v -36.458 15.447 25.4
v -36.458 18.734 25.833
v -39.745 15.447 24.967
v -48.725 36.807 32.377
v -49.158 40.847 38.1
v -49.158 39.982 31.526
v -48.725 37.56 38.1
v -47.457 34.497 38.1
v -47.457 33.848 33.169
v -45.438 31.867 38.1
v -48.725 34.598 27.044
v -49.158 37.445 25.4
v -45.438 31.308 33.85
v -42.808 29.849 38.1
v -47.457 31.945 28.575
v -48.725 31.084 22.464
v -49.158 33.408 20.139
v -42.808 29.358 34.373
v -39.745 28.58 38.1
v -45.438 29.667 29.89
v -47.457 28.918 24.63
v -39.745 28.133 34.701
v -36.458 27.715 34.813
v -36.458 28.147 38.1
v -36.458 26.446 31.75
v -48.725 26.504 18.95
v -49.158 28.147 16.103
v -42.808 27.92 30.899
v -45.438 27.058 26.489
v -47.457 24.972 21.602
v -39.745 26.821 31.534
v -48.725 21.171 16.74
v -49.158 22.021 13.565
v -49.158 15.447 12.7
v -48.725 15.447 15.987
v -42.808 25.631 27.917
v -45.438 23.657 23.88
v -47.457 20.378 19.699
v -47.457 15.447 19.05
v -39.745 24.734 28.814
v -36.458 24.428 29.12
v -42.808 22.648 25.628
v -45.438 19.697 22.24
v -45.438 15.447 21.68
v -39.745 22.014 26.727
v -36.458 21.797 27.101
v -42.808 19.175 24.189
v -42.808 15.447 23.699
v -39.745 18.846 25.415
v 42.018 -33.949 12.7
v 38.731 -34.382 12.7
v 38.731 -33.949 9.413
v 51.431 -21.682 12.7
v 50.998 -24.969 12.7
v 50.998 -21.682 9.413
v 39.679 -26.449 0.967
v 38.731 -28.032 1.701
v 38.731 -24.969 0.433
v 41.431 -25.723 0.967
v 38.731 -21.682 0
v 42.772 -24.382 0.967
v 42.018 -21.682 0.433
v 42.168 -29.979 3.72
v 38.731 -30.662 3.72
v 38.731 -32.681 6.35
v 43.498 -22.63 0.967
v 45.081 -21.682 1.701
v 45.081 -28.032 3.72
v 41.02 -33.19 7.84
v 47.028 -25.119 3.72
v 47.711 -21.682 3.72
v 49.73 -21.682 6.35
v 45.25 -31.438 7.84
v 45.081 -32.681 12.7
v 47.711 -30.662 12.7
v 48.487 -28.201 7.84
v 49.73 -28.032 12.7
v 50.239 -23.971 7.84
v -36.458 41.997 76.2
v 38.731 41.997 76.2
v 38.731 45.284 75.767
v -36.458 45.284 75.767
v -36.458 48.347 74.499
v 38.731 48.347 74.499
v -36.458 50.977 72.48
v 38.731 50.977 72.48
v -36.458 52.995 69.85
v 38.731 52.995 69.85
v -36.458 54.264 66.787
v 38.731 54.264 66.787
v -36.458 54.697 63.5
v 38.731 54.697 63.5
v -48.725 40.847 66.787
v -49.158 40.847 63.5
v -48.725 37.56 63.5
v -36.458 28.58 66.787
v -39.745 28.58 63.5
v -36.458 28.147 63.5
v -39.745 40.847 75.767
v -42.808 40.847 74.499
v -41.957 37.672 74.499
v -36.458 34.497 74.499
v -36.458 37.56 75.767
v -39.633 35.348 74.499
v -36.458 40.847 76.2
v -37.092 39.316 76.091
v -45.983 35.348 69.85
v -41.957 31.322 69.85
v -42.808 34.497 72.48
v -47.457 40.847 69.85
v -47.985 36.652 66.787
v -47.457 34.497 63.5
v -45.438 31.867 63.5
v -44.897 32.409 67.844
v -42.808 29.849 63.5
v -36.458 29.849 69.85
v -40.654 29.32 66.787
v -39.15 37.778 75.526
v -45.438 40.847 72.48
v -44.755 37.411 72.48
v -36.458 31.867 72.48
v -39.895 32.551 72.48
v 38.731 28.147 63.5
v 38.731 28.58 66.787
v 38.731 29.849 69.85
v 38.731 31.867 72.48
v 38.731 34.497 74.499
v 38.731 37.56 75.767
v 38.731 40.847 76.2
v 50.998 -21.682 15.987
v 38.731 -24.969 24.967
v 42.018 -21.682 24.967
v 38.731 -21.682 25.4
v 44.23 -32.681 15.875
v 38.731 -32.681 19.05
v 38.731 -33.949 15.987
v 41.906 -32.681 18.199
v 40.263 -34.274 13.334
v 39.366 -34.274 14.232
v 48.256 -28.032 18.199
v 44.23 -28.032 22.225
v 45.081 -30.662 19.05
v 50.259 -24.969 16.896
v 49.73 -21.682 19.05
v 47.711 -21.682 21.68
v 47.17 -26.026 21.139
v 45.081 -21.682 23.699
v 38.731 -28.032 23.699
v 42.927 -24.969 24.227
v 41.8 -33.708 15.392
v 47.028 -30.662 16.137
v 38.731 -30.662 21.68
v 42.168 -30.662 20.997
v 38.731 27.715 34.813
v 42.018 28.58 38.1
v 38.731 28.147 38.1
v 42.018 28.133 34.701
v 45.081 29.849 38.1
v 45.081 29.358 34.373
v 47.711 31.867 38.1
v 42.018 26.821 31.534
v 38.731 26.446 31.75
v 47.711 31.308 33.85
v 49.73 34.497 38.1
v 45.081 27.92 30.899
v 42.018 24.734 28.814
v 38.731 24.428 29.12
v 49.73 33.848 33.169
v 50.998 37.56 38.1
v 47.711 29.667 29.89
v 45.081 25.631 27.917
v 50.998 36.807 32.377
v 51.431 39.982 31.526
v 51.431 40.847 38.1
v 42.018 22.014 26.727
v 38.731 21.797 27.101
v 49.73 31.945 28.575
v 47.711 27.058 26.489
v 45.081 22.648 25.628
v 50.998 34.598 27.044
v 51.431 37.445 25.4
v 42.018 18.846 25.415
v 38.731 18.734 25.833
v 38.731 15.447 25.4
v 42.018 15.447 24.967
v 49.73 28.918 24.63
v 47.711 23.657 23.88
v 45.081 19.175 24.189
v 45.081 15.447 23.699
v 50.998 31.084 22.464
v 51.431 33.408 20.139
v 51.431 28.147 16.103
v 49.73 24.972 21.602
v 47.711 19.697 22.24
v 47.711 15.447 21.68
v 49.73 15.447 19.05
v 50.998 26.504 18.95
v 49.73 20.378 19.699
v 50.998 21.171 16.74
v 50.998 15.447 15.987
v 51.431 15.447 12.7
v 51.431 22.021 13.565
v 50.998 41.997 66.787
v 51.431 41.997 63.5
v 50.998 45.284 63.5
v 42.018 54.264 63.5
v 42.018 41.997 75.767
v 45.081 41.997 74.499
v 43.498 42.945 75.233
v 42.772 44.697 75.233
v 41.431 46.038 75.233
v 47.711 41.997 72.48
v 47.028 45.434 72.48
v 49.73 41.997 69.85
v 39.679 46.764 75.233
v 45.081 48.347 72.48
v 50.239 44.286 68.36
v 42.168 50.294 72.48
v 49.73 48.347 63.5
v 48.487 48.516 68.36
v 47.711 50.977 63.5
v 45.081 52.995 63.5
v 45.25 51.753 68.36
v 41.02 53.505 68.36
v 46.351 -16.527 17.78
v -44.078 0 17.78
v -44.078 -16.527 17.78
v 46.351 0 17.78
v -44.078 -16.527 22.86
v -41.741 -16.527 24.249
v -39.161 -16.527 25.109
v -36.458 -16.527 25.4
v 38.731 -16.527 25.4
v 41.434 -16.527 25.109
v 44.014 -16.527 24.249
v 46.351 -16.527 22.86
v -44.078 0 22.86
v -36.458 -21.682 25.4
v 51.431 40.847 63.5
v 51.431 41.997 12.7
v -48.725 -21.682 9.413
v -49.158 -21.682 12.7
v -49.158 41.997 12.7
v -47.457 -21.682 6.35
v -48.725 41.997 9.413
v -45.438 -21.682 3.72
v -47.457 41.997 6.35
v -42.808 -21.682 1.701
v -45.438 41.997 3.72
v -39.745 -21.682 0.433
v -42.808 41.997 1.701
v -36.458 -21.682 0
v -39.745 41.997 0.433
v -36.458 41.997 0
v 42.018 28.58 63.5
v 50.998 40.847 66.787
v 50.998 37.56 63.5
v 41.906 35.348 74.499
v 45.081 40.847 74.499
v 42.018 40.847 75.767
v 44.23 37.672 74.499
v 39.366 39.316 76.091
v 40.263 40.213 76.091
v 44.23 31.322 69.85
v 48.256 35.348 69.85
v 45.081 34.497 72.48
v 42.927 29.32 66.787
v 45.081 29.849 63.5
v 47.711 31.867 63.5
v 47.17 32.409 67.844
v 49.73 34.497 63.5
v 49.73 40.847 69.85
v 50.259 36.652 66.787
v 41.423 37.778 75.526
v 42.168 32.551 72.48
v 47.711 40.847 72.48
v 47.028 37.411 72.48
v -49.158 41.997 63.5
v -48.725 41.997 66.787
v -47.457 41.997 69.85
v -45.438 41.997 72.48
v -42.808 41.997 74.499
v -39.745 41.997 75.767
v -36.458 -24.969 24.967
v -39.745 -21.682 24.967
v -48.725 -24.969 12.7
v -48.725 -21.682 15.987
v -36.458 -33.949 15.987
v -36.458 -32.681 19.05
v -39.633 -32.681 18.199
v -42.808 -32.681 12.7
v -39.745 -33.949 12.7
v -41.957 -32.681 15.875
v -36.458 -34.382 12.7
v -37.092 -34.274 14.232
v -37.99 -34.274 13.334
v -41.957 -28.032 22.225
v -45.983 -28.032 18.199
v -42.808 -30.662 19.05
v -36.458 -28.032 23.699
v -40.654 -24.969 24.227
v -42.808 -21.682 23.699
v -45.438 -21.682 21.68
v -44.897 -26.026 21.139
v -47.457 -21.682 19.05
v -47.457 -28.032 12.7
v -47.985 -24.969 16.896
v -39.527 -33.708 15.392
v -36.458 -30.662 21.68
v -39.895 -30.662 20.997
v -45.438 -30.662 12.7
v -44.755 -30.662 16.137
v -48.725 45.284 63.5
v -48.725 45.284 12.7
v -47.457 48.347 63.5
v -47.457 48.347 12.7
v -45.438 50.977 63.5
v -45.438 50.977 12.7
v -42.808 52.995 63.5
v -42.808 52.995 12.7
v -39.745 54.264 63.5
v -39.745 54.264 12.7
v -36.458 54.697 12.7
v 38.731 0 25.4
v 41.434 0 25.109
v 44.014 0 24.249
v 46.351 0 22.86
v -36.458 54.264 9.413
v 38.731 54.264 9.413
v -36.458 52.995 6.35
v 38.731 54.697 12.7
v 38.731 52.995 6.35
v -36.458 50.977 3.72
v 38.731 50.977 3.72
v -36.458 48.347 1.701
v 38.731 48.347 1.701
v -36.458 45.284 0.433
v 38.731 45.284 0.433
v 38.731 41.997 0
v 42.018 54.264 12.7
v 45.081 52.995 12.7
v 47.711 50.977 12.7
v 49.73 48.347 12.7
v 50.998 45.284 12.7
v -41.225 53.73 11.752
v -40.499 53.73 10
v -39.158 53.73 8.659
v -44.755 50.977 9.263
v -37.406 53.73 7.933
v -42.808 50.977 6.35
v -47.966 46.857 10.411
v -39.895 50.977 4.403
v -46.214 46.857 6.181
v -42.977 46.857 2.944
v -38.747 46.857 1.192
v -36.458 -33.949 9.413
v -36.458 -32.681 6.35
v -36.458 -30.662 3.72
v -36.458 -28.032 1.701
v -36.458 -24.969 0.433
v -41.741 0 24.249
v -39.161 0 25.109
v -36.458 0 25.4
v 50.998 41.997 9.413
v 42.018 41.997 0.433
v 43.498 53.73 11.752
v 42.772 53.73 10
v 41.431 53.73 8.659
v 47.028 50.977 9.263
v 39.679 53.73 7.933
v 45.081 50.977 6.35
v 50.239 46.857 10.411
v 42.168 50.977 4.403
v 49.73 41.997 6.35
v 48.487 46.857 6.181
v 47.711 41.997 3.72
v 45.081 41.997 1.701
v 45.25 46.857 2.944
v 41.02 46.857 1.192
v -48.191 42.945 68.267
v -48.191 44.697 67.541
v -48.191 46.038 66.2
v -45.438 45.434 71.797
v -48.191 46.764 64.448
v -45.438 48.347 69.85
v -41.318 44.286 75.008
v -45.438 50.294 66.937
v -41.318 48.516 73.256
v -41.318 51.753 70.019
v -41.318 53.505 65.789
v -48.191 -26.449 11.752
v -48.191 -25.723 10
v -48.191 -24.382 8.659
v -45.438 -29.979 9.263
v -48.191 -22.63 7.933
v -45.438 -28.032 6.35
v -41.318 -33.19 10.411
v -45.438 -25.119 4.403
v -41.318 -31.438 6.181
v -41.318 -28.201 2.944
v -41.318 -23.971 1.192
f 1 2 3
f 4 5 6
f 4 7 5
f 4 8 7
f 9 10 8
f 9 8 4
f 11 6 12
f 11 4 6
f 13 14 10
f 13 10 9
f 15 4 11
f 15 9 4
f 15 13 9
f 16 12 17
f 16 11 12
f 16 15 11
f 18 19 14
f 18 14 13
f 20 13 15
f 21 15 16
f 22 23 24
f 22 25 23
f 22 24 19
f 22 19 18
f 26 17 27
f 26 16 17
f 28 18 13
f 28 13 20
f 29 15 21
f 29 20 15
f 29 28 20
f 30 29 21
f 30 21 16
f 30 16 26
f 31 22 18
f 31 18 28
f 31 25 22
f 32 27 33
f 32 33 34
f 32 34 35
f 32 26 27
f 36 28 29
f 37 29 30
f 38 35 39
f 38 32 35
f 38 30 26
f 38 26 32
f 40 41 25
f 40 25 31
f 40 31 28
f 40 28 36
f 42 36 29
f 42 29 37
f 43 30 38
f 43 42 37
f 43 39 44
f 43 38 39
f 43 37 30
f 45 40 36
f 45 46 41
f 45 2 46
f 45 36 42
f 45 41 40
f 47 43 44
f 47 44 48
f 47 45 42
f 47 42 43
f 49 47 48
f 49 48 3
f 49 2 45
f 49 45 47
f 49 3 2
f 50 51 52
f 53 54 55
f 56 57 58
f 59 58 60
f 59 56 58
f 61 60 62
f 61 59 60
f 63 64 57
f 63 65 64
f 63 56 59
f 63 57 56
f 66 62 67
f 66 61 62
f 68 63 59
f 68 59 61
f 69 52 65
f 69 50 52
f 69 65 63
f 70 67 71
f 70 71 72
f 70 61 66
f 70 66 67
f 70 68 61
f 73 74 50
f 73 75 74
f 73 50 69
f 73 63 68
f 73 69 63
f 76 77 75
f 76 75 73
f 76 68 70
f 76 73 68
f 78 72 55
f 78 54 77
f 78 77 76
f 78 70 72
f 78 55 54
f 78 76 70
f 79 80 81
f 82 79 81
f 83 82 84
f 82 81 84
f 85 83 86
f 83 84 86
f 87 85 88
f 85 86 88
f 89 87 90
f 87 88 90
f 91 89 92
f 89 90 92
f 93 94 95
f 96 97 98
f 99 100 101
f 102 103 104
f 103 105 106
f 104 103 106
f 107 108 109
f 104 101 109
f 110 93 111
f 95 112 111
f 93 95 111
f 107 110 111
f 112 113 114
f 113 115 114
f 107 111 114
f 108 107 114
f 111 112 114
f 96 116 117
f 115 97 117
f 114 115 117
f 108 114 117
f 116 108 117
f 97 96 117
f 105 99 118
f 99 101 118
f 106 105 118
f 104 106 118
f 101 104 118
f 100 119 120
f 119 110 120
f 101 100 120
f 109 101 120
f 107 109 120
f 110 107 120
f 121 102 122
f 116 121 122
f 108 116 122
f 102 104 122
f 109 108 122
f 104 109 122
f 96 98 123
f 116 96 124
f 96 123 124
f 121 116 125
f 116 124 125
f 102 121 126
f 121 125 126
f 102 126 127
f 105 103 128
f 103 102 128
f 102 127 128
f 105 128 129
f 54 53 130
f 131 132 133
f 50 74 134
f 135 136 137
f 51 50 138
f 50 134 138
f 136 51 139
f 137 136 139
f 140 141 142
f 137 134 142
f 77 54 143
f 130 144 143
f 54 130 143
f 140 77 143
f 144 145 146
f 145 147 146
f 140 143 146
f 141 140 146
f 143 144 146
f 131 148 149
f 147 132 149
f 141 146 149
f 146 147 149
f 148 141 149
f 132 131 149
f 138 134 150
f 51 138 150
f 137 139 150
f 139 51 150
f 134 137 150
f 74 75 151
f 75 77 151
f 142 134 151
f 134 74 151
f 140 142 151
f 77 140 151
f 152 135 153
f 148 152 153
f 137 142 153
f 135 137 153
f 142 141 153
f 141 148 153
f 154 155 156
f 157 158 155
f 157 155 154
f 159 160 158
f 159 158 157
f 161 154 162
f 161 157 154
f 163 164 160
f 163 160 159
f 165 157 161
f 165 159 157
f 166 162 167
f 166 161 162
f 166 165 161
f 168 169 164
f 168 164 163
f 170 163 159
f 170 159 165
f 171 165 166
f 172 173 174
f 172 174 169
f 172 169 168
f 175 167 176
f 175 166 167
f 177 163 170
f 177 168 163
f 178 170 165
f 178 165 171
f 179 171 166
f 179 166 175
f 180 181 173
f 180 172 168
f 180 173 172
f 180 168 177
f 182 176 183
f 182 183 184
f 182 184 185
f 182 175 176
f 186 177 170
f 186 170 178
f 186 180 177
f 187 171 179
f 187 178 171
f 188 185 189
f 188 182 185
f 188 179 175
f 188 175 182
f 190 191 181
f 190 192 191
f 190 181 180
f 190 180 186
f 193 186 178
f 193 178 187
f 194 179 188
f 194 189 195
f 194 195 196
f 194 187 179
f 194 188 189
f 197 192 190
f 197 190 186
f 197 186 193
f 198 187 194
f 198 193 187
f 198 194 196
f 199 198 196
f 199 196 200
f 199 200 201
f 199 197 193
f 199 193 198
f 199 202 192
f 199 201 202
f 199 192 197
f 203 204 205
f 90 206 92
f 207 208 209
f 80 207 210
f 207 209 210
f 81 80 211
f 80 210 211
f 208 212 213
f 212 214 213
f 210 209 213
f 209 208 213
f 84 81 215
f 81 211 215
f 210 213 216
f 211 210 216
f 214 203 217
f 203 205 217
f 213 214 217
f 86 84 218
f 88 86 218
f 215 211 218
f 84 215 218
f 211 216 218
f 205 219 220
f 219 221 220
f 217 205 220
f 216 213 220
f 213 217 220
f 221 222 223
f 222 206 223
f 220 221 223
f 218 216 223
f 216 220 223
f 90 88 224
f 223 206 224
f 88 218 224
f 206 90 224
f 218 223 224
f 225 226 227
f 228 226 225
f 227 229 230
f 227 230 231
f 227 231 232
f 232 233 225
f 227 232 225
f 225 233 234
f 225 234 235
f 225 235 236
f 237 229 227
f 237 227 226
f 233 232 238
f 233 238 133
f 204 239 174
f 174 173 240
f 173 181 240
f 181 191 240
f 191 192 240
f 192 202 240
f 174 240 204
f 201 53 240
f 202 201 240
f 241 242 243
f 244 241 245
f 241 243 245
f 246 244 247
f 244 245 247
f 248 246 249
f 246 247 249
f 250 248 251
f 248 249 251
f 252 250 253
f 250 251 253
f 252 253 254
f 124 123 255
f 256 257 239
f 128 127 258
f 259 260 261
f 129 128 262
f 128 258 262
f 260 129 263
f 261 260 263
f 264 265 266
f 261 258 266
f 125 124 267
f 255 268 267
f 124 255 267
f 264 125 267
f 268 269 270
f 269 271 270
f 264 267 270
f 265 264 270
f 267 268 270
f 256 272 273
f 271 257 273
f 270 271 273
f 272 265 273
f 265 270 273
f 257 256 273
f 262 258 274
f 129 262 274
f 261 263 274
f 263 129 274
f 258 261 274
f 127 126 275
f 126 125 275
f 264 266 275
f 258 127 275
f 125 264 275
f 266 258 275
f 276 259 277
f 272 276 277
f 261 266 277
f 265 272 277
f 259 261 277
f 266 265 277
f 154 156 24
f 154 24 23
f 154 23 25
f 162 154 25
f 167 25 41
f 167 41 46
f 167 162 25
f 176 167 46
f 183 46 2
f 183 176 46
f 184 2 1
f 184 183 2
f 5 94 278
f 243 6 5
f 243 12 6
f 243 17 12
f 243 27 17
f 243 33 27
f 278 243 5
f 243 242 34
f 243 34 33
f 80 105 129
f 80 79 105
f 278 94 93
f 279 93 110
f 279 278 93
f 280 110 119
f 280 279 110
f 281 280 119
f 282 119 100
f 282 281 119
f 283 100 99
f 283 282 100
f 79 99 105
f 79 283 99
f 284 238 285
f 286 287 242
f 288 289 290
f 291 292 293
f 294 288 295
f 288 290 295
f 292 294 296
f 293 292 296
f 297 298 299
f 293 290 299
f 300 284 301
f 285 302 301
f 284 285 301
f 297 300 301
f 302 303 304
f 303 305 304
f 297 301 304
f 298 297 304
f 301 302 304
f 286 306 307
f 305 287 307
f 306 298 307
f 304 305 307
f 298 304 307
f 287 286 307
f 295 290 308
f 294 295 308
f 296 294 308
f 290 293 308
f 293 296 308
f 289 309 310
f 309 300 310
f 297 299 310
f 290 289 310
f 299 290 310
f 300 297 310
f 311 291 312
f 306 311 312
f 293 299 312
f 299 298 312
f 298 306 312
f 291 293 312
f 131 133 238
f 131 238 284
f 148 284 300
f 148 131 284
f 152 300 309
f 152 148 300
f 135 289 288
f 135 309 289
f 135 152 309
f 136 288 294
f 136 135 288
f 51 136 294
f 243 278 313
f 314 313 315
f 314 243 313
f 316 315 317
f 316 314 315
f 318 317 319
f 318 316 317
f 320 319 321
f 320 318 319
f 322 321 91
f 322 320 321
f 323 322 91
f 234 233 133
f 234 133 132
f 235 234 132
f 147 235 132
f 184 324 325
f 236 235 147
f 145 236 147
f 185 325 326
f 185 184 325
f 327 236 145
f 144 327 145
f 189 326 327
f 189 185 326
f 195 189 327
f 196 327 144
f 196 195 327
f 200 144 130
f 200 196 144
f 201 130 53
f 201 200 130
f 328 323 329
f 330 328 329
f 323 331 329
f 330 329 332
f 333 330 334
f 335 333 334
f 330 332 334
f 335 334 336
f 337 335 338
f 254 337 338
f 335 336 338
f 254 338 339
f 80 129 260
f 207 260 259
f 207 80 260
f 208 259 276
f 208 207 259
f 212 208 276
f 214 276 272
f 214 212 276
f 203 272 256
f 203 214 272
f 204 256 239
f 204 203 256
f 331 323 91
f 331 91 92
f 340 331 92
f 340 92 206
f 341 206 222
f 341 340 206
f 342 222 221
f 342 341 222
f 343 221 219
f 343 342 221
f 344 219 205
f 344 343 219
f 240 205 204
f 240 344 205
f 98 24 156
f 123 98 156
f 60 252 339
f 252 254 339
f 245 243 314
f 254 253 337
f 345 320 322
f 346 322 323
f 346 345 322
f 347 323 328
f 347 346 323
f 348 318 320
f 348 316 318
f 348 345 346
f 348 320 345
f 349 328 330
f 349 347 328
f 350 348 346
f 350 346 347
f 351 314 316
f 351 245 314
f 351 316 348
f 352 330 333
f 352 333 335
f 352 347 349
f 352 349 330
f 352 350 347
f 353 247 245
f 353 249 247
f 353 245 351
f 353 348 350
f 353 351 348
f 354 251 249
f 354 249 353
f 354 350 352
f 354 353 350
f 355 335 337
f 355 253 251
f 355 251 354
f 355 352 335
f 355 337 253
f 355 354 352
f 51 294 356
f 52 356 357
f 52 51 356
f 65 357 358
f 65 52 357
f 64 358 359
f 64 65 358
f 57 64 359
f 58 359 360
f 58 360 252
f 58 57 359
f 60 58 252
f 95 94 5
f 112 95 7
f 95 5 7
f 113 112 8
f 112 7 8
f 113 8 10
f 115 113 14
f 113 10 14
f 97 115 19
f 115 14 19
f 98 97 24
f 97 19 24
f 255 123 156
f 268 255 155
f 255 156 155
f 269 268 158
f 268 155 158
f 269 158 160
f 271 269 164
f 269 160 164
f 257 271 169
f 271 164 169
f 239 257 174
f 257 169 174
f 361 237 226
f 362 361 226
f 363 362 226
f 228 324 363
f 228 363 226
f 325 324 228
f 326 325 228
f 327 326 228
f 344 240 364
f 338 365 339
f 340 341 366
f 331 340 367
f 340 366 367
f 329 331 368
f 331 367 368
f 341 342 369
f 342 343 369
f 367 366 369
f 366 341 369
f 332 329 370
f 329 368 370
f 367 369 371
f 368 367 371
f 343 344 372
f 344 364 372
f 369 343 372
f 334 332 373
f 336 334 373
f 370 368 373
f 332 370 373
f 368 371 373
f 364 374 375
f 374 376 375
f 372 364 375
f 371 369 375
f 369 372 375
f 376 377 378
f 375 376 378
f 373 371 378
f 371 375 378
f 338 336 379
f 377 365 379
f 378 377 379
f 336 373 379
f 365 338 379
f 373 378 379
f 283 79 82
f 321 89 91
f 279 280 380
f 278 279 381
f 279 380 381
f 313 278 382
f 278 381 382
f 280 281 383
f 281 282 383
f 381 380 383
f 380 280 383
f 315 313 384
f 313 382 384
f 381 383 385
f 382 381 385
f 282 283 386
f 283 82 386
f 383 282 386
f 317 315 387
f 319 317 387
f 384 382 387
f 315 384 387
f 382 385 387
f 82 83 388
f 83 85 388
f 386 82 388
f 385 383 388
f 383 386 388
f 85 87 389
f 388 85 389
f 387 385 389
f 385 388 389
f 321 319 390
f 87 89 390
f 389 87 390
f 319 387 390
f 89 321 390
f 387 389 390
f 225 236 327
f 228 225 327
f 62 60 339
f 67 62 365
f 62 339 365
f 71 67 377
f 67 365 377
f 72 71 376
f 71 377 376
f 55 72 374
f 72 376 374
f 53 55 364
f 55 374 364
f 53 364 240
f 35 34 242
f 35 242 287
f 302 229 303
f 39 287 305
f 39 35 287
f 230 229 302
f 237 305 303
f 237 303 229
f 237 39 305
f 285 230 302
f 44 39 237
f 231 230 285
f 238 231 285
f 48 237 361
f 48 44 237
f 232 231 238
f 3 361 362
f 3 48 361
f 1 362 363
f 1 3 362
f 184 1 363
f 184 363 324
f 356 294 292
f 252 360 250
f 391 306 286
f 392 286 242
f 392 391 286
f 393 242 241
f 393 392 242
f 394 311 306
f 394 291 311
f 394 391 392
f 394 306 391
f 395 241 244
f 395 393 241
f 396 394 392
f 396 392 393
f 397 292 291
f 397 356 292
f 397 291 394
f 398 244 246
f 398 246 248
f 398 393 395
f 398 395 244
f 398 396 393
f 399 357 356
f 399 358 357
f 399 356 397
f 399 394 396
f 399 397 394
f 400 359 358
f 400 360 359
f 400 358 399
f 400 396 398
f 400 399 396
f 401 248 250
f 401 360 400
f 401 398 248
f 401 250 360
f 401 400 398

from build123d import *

# Parameters (mm, degrees)
F0_W         = 100.5891636014
F0_H         = 89.0790522099
F1_DEPTH     = 25.4
F2_W         = 100.5891636014
F2_H         = 26.5494063497
F3_DEPTH     = 50.8
F4_W         = 90.4291636014
F4_H         = 16.5267549455
F5_DEPTH     = 7.62
F6_F1_R      = 12.7
F6_F2_R      = 12.6999
F6_T3_DEPTH  = 49.8296458602
F6_T5_DEPTH  = 38.1
F6_T8_ANGLE  = 90
F6_T10_ANGLE = 90
F6_T12_ANGLE = 90
F6_T14_ANGLE = 90
F6_T16_ANGLE = 90
F6_T18_ANGLE = 90


# Not quite as in the source:
# - a fillet or chamfer that OpenCascade refuses, or shapes differently, is made with other operations: its cross-section is extruded or revolved along the edge and cut away or added
# - a fillet or chamfer is up to 0.001 mm smaller than in the source, because OpenCascade refuses the exact size


with BuildPart() as f1:
    # F0 (on Top) → F1 (new body)
    with BuildSketch(Plane.XY):
        with Locations((1.1365450919, 10.1573467255)):
            Rectangle(F0_W, F0_H)
    extrude(amount=F1_DEPTH)

    # F2 (on face) → F3 (join)
    with BuildSketch(Plane.XY.offset(25.4)):
        with Locations((1.1365450919, 41.4221696556)):
            Rectangle(F2_W, F2_H)
    extrude(amount=F3_DEPTH)

    # F4 (on face) → F5 (cut)
    with BuildSketch(Plane.XY.offset(25.4)):
        with Locations((1.1365450919, -8.2633774728)):
            Rectangle(F4_W, F4_H)
    extrude(amount=-F5_DEPTH, mode=Mode.SUBTRACT)

    # F6: fillet of radius 12.7 on 18 edges, made by hand

    # F6_f1
    f6_f1_edges = [f1.edges().sort_by_distance(p)[0] for p in [
        (1.1365450919, 28.1474664807, 25.4),
    ]]
    fillet(f6_f1_edges, radius=F6_F1_R)

    # F6_f2 (radius 12.7 in the source; OpenCascade refuses exactly that, so slightly less here)
    f6_f2_edges = [f1.edges().sort_by_distance(p)[0] for p in [
        (1.1365450919, -34.3821793795, 25.4),
        (51.4311268926, -34.3821793795, 12.7),
        (1.1365450919, -34.3821793795, 0),
        (-49.1580367088, -34.3821793795, 12.7),
        (1.1365450919, 28.1474664807, 76.2),
        (51.4311268926, 10.1573467255, 0),
        (51.4311268926, 54.6968728304, 38.1),
        (51.4311268926, 41.4221696556, 76.2),
        (1.1365450919, 54.6968728304, 76.2),
        (-49.1580367088, 41.4221696556, 76.2),
        (-49.1580367088, 10.1573467255, 0),
        (-49.1580367088, 54.6968728304, 38.1),
        (1.1365450919, 54.6968728304, 0),
    ]]
    fillet(f6_f2_edges, radius=F6_F2_R)

    # F6_s4 → F6_t3 (cut)
    with BuildSketch(Plane.XZ.offset(-15.4474664807)):
        with BuildLine():
            ThreePointArc((-49.1580367088, 12.7), (-45.4382928299, 21.6802561211), (-36.4580367088, 25.4))
            Line((-36.4580367088, 25.4), (-36.4580367088, 25.654))
            Line((-36.4580367088, 25.654), (-49.4120367088, 25.654))
            Line((-49.4120367088, 25.654), (-49.4120367088, 12.7))
            Line((-49.4120367088, 12.7), (-49.1580367088, 12.7))
        make_face()
        with BuildLine():
            ThreePointArc((38.7311268926, 25.4), (47.7113830136, 21.6802561211), (51.4311268926, 12.7))
            Line((51.4311268926, 12.7), (51.6851268926, 12.7))
            Line((51.6851268926, 12.7), (51.6851268926, 25.654))
            Line((51.6851268926, 25.654), (38.7311268926, 25.654))
            Line((38.7311268926, 25.654), (38.7311268926, 25.4))
        make_face()
    extrude(amount=F6_T3_DEPTH, mode=Mode.SUBTRACT)

    # F6_s6 → F6_t5 (cut)
    with BuildSketch(Plane.XY.offset(38.1)):
        with BuildLine():
            ThreePointArc((-49.1580367088, 40.8474664807), (-45.4382928299, 31.8672103597), (-36.4580367088, 28.1474664807))
            Line((-36.4580367088, 28.1474664807), (-36.4580367088, 27.8934664807))
            Line((-36.4580367088, 27.8934664807), (-49.4120367088, 27.8934664807))
            Line((-49.4120367088, 27.8934664807), (-49.4120367088, 40.8474664807))
            Line((-49.4120367088, 40.8474664807), (-49.1580367088, 40.8474664807))
        make_face()
        with BuildLine():
            ThreePointArc((38.7311268926, 28.1474664807), (47.7113830136, 31.8672103597), (51.4311268926, 40.8474664807))
            Line((51.4311268926, 40.8474664807), (51.6851268926, 40.8474664807))
            Line((51.6851268926, 40.8474664807), (51.6851268926, 27.8934664807))
            Line((51.6851268926, 27.8934664807), (38.7311268926, 27.8934664807))
            Line((38.7311268926, 27.8934664807), (38.7311268926, 28.1474664807))
        make_face()
    extrude(amount=F6_T5_DEPTH, mode=Mode.SUBTRACT)

    # F6_s7 → F6_t8 (revolve, cut)
    with BuildSketch(Plane.XY.offset(12.7)):
        with BuildLine():
            ThreePointArc((38.7312268926, -34.3821793795), (47.711412303, -30.6624647899), (51.4311268926, -21.6822793795))
            Line((51.4311268926, -21.6822793795), (51.4311268926, -34.3821793795))
            Line((51.4311268926, -34.3821793795), (38.7312268926, -34.3821793795))
        make_face()
    revolve(axis=Axis((38.7311268926, -34.3821793795, 12.7), (0, -1, 0)), revolution_arc=F6_T8_ANGLE, mode=Mode.SUBTRACT)

    # F6_s9 → F6_t10 (revolve, cut)
    with BuildSketch(Plane.YZ.offset(38.7311268926)):
        with BuildLine():
            ThreePointArc((40.8473664807, 76.2), (31.8671810703, 72.4802854104), (28.1474664807, 63.5001))
            Line((28.1474664807, 63.5001), (28.1474664807, 76.2))
            Line((28.1474664807, 76.2), (40.8473664807, 76.2))
        make_face()
    revolve(axis=Axis((38.7311268926, 40.8474664807, 76.2), (0, 0, 1)), revolution_arc=F6_T10_ANGLE, mode=Mode.SUBTRACT)

    # F6_s11 → F6_t12 (revolve, cut)
    with BuildSketch(Plane.XZ.offset(-40.8474664807)):
        with BuildLine():
            ThreePointArc((-36.4581367088, 76.2), (-45.4383221192, 72.4802854104), (-49.1580367088, 63.5001))
            Line((-49.1580367088, 63.5001), (-49.1580367088, 76.2))
            Line((-49.1580367088, 76.2), (-36.4581367088, 76.2))
        make_face()
    revolve(axis=Axis((-36.4580367088, 40.8474664807, 76.2), (0, 0, 1)), revolution_arc=F6_T12_ANGLE, mode=Mode.SUBTRACT)

    # F6_s13 → F6_t14 (revolve, cut)
    with BuildSketch(Plane.YZ.offset(-36.4580367088)):
        with BuildLine():
            ThreePointArc((-34.3821793795, 12.7001), (-30.6624647899, 21.6802854104), (-21.6822793795, 25.4))
            Line((-21.6822793795, 25.4), (-34.3821793795, 25.4))
            Line((-34.3821793795, 25.4), (-34.3821793795, 12.7001))
        make_face()
    revolve(axis=Axis((-36.4580367088, -34.3821793795, 12.7), (0, -1, 0)), revolution_arc=F6_T14_ANGLE, mode=Mode.SUBTRACT)

    # F6_s15 → F6_t16 (revolve, cut)
    with BuildSketch(Plane.XY.offset(38.1)):
        with BuildLine():
            ThreePointArc((38.7311268926, 28.1474664807), (47.7113830136, 31.8672103597), (51.4311268926, 40.8474664807))
            Line((51.4311268926, 40.8474664807), (51.6851268926, 40.8474664807))
            Line((51.6851268926, 40.8474664807), (51.6851268926, 27.8934664807))
            Line((51.6851268926, 27.8934664807), (38.7311268926, 27.8934664807))
            Line((38.7311268926, 27.8934664807), (38.7311268926, 28.1474664807))
        make_face()
    revolve(axis=Axis((51.4311268926, 15.4474664807, 38.1), (-1, 0, 0)), revolution_arc=F6_T16_ANGLE, mode=Mode.SUBTRACT)

    # F6_s17 → F6_t18 (revolve, cut)
    with BuildSketch(Plane.XY.offset(38.1)):
        with BuildLine():
            ThreePointArc((-49.1580367088, 40.8474664807), (-45.4382928299, 31.8672103597), (-36.4580367088, 28.1474664807))
            Line((-36.4580367088, 28.1474664807), (-36.4580367088, 27.8934664807))
            Line((-36.4580367088, 27.8934664807), (-49.4120367088, 27.8934664807))
            Line((-49.4120367088, 27.8934664807), (-49.4120367088, 40.8474664807))
            Line((-49.4120367088, 40.8474664807), (-49.1580367088, 40.8474664807))
        make_face()
    revolve(axis=Axis((-49.1580367088, 15.4474664807, 38.1), (-1, 0, 0)), revolution_arc=F6_T18_ANGLE, mode=Mode.SUBTRACT)


solid = f1.part
